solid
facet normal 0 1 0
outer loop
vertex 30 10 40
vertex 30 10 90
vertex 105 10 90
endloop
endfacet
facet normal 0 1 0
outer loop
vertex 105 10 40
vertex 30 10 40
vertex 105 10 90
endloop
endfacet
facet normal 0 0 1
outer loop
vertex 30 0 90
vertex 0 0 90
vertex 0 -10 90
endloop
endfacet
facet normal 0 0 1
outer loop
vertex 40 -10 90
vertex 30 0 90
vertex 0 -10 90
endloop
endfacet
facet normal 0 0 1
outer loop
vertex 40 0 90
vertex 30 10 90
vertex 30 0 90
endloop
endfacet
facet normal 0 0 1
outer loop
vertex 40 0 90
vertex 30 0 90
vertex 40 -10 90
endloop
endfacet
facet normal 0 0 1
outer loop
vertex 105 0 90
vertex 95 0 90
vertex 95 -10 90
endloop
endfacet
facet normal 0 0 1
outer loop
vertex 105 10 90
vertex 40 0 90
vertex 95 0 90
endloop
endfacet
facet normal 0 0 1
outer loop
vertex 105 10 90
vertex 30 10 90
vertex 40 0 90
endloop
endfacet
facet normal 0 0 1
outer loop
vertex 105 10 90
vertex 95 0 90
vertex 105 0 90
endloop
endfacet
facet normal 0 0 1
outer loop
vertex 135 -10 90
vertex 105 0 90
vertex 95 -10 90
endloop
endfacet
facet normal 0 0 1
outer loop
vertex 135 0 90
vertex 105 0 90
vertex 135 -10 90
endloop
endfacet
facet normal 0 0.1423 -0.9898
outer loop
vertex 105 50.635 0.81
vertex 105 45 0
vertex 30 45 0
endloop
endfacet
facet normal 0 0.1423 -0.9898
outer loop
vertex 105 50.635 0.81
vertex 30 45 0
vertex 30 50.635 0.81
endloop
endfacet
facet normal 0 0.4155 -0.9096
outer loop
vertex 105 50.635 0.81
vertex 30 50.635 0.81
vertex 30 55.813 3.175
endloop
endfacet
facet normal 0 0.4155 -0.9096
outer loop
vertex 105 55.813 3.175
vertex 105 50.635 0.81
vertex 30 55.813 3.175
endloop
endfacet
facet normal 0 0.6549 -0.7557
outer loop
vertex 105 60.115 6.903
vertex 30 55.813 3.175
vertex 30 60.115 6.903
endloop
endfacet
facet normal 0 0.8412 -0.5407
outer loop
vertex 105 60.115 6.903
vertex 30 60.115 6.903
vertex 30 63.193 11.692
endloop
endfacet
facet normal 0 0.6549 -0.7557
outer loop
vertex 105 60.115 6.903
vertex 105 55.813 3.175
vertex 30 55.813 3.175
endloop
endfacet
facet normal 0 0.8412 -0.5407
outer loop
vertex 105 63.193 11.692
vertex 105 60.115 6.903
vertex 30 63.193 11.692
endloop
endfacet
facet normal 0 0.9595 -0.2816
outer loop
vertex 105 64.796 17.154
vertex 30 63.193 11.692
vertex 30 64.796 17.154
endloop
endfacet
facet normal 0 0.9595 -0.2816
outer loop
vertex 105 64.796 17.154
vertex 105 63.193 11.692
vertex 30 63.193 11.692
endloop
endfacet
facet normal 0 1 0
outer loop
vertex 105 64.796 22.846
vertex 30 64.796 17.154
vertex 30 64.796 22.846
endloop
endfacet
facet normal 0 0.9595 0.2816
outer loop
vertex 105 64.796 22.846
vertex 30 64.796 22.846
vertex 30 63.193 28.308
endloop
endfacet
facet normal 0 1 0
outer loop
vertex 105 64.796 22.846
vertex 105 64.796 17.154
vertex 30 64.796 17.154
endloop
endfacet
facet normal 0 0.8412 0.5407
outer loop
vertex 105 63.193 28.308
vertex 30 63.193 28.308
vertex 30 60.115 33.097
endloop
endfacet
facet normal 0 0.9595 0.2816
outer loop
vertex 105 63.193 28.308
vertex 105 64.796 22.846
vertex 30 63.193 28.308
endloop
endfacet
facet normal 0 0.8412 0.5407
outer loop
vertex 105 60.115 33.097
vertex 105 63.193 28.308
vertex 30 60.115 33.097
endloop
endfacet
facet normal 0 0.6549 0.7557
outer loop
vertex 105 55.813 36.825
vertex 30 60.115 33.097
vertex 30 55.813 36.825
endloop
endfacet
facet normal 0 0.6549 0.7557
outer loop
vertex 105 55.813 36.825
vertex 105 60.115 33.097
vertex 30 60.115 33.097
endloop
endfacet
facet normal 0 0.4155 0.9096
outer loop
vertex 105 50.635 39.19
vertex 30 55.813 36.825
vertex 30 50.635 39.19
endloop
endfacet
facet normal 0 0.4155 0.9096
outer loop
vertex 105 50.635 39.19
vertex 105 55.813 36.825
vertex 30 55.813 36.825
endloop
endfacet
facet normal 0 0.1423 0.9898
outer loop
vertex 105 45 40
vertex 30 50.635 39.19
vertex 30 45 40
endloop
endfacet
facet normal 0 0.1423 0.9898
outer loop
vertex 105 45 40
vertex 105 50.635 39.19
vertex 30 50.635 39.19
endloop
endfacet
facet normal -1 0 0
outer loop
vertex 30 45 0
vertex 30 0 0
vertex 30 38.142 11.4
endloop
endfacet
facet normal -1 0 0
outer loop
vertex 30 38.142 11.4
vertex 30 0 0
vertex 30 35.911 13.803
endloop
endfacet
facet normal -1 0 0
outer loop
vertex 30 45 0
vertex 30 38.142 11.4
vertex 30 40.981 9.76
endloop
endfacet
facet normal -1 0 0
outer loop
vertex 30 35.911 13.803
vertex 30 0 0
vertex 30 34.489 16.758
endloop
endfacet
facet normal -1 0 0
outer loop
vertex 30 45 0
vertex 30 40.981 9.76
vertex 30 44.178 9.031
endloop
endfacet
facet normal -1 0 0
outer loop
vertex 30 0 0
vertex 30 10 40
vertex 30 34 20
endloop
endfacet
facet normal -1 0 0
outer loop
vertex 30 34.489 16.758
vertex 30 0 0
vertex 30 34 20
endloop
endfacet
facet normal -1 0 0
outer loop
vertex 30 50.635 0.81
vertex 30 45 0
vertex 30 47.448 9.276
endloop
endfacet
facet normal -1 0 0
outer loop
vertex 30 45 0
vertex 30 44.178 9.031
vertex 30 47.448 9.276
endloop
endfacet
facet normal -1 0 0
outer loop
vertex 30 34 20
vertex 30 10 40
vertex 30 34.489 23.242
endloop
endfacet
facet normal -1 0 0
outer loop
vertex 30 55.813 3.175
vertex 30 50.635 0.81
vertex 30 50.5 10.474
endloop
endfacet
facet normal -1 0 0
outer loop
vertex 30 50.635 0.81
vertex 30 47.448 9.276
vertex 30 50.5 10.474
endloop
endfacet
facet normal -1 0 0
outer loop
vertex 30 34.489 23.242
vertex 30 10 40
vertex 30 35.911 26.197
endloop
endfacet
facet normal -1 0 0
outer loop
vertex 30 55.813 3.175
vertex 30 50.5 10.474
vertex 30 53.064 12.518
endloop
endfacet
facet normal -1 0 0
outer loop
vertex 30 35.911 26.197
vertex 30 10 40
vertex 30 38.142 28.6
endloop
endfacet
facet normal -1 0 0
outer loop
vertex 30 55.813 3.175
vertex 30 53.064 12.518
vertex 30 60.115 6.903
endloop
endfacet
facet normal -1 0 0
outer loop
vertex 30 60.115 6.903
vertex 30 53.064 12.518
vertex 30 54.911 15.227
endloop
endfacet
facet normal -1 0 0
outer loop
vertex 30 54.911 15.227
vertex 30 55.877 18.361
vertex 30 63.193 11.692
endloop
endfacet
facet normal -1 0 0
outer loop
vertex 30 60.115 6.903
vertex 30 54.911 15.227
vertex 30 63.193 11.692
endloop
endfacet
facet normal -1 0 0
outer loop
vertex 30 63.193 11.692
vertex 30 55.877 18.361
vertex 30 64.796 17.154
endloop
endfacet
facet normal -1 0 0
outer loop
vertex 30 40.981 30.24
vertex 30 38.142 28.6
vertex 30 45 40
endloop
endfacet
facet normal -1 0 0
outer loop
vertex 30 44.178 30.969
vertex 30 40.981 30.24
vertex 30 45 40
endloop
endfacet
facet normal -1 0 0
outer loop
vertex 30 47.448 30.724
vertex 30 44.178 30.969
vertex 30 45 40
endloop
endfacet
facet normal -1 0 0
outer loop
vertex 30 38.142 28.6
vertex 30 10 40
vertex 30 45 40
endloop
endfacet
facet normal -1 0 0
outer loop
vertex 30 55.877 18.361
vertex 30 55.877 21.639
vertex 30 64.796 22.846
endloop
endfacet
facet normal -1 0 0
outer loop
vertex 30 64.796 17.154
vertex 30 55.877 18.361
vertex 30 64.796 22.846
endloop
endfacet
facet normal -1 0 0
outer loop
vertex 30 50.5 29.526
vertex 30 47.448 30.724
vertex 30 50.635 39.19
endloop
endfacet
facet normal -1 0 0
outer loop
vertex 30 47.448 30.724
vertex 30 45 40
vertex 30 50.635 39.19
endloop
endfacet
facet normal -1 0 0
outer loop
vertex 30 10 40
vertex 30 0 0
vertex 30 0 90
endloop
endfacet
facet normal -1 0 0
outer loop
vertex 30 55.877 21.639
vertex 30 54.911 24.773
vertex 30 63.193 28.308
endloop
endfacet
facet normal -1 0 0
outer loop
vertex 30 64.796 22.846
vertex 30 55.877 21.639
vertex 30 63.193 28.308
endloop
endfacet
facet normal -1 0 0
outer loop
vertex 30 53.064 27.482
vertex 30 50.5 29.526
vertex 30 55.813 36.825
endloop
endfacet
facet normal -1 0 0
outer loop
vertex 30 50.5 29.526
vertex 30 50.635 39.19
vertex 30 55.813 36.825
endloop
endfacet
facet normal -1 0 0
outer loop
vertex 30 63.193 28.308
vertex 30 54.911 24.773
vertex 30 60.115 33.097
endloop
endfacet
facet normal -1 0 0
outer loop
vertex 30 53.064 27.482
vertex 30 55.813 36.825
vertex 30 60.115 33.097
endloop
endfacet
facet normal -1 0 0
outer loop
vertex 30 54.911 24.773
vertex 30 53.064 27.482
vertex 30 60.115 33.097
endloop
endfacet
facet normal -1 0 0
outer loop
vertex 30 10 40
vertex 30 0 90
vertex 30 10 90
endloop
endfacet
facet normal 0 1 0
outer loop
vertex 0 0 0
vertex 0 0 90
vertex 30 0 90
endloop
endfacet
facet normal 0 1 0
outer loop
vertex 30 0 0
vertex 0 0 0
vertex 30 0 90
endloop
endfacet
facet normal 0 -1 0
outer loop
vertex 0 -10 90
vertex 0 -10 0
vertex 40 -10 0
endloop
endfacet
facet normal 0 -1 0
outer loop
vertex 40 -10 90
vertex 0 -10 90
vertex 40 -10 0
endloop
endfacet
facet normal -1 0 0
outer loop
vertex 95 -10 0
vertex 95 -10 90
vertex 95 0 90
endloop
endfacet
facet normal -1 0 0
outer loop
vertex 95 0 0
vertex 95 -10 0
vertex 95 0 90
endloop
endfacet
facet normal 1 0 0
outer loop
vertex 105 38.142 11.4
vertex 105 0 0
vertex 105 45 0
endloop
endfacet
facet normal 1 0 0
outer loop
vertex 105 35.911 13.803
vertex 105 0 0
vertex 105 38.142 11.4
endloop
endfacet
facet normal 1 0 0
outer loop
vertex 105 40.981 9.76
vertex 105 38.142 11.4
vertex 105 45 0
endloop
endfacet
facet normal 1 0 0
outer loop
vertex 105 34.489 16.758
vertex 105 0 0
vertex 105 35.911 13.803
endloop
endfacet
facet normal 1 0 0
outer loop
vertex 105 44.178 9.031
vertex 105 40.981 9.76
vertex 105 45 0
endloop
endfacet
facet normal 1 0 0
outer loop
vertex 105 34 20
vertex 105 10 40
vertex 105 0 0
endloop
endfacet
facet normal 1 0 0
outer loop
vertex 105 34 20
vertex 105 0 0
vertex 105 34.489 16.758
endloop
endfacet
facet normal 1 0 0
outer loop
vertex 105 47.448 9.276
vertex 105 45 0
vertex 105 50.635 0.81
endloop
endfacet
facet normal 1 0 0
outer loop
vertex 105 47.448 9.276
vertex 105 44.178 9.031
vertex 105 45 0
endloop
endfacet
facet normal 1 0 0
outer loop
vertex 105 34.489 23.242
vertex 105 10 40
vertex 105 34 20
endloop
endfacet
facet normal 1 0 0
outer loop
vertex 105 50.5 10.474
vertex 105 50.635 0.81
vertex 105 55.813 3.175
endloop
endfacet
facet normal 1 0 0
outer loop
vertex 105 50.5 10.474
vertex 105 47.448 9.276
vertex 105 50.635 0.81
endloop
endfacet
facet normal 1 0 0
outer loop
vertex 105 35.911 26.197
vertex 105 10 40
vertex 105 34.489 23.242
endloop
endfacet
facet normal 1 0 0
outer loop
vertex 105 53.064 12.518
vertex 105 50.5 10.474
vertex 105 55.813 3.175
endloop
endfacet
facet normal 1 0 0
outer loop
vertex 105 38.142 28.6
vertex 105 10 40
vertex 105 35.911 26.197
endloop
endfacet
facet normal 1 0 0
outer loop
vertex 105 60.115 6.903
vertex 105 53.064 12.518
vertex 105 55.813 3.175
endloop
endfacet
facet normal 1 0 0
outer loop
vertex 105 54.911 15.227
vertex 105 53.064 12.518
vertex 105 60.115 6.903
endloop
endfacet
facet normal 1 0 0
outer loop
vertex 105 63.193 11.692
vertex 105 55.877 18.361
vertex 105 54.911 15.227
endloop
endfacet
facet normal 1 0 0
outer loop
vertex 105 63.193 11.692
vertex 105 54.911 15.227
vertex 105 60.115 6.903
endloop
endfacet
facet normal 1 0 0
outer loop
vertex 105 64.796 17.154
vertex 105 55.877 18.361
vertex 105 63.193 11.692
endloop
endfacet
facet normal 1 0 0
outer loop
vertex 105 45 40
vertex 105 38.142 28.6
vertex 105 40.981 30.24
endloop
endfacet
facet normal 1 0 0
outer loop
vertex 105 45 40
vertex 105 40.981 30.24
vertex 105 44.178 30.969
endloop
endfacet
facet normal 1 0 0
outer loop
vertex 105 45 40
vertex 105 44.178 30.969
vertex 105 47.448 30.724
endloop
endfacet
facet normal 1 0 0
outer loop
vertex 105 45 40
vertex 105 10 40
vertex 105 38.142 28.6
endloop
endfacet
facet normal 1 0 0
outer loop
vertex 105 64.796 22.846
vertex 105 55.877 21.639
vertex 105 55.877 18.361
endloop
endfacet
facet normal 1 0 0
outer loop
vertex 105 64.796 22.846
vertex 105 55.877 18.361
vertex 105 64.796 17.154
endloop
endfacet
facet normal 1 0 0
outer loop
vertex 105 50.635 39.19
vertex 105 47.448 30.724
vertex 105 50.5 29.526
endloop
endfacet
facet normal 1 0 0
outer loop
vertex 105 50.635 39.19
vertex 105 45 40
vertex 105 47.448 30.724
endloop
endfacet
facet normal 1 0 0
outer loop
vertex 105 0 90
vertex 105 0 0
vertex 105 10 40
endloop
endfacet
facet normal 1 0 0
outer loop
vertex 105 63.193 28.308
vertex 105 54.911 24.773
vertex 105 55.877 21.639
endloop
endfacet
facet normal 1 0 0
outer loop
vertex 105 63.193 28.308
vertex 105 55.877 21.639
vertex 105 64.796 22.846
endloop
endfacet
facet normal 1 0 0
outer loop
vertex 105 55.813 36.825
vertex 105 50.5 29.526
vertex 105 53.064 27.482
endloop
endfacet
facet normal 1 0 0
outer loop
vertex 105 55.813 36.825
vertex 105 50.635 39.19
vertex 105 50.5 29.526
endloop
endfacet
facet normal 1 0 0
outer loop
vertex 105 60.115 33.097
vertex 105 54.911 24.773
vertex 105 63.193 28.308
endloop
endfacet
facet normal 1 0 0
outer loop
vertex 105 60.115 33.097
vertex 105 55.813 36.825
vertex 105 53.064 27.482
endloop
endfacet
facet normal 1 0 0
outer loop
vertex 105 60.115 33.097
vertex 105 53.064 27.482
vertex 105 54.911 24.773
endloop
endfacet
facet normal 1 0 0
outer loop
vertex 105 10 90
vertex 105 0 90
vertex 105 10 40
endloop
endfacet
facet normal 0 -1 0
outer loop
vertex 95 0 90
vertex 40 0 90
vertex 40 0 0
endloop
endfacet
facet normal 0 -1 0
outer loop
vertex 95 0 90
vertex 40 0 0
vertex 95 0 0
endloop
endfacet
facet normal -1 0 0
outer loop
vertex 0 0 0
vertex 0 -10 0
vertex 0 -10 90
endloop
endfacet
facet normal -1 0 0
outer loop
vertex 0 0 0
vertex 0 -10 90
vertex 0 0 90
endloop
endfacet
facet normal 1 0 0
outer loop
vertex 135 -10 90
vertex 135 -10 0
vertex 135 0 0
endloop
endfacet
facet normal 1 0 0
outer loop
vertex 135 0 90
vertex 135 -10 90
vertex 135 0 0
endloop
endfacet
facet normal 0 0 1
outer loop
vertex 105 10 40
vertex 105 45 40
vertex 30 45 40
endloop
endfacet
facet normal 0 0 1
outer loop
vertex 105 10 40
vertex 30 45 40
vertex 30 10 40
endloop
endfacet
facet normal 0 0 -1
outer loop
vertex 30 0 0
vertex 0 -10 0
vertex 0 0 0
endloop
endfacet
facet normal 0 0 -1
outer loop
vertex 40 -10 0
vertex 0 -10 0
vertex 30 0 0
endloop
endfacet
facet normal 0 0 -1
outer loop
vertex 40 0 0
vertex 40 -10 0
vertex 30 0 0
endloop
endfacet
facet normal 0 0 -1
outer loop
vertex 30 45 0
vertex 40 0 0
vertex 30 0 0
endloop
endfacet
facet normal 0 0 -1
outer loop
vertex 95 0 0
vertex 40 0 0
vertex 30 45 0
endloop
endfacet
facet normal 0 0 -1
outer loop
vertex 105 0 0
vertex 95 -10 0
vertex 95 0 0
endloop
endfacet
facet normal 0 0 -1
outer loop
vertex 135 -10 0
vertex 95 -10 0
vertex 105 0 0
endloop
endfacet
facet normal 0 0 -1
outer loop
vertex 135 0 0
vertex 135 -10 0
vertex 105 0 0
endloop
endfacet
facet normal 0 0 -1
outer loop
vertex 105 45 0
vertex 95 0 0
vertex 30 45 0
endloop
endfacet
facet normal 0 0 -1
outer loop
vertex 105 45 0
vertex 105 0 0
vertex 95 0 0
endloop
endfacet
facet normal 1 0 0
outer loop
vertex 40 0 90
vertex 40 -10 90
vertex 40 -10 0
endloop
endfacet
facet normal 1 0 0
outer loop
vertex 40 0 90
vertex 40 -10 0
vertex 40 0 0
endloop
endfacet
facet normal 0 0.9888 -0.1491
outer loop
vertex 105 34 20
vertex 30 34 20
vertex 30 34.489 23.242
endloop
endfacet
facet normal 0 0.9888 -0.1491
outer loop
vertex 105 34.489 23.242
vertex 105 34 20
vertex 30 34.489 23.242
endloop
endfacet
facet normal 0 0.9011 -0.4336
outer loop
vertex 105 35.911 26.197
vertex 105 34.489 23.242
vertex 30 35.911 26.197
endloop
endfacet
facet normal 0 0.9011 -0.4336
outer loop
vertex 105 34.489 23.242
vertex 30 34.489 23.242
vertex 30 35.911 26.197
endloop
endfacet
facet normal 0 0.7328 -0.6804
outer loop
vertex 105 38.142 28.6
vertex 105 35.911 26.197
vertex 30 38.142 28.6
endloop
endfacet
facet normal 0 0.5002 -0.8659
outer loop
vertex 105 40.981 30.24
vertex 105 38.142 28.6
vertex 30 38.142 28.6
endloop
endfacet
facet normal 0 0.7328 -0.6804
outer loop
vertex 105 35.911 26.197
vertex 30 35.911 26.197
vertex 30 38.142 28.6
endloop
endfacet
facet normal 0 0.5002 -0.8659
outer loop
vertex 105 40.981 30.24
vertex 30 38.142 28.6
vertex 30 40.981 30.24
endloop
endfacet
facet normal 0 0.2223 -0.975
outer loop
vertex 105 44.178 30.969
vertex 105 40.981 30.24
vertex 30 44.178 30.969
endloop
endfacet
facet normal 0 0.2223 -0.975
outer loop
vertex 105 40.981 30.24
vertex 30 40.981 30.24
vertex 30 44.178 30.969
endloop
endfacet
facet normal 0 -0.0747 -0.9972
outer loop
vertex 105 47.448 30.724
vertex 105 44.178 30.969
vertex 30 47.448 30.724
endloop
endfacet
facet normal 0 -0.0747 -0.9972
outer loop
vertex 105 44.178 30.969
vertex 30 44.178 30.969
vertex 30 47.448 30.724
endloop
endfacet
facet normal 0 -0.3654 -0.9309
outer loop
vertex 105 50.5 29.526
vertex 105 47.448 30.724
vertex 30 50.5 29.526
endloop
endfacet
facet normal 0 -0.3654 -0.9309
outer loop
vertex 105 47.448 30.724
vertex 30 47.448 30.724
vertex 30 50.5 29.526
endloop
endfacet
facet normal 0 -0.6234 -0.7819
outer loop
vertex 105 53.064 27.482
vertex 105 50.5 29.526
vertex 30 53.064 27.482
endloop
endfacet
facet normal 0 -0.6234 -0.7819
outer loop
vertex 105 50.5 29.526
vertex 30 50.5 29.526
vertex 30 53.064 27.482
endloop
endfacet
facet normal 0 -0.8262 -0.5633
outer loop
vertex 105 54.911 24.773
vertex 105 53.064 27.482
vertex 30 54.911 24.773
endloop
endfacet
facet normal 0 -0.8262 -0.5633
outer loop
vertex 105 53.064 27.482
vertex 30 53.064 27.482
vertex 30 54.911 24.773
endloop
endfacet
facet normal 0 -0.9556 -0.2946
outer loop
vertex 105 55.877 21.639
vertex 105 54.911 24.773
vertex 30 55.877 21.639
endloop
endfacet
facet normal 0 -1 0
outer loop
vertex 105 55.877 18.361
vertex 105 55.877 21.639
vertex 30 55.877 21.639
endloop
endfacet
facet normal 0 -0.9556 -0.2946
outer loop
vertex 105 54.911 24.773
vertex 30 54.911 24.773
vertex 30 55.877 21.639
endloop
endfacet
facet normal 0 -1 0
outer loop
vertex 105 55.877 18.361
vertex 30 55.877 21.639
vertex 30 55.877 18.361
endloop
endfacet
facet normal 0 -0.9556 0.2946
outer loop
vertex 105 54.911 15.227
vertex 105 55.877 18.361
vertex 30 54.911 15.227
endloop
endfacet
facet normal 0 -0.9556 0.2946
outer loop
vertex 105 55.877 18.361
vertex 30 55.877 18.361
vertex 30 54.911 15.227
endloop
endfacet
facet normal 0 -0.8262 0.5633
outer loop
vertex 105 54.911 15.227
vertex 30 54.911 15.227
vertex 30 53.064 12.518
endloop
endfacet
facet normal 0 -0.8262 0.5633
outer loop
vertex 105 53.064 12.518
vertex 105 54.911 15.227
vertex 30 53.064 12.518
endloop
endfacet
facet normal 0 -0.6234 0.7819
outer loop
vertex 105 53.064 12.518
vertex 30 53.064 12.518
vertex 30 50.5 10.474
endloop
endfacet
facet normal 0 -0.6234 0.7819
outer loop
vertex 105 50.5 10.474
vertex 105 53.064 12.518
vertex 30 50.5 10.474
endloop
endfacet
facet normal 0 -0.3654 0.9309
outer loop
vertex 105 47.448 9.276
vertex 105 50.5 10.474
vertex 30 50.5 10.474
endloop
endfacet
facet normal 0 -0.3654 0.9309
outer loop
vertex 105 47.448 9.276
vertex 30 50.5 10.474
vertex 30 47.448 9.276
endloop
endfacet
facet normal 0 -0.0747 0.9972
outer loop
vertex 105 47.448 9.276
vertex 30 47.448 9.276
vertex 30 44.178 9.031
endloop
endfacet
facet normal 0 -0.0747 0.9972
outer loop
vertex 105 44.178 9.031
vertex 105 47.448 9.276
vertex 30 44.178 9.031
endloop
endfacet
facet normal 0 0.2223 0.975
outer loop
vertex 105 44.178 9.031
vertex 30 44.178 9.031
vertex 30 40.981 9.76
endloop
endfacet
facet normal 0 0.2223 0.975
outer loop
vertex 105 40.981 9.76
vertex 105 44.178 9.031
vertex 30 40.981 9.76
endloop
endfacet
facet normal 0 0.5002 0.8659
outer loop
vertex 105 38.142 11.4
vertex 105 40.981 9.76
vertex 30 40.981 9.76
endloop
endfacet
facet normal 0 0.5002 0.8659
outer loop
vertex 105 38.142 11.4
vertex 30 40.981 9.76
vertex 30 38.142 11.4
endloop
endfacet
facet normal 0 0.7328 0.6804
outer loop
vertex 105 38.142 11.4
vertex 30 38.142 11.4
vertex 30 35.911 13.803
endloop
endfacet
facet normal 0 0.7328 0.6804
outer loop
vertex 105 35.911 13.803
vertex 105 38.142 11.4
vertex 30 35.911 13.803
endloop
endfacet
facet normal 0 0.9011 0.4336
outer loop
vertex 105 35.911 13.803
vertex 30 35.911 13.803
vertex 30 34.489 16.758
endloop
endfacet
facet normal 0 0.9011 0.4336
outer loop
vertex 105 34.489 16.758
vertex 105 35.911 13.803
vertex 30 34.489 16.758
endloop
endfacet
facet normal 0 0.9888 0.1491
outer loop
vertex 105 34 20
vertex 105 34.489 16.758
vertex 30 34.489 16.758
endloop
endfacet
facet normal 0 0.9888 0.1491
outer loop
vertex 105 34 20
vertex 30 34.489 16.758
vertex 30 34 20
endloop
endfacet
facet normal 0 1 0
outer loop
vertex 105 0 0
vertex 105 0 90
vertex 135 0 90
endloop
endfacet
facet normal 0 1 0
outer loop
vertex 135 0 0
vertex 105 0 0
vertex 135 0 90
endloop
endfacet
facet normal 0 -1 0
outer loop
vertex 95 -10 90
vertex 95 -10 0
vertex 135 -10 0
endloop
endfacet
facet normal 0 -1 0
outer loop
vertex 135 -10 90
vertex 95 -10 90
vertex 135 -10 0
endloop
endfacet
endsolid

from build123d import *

# Parameters (mm, degrees)
F0_W     = 135
F0_H     = 10
F1_DEPTH = 90
F2_W     = 75
F2_H     = 90
F3_DEPTH = 10
F4_W     = 55
F4_H     = 10
F5_DEPTH = 90.001
F7_DEPTH = 75
F10_D    = 22


with BuildPart() as f1:
    # F0 (on Top) → F1 (new body)
    with BuildSketch(Plane.XY):
        with Locations((67.5, -5)):
            Rectangle(F0_W, F0_H)
    extrude(amount=F1_DEPTH)

    # F2 (on Front) → F3 (join)
    with BuildSketch(Plane.XZ):
        with Locations((67.5, 45)):
            Rectangle(F2_W, F2_H)
    extrude(amount=-F3_DEPTH)

    # F4 (on face) → F5 (cut, through all)
    with BuildSketch(Plane.XY.offset(90)):
        with Locations((67.5, -5)):
            Rectangle(F4_W, F4_H)
    extrude(amount=-F5_DEPTH, mode=Mode.SUBTRACT)

    # F6 (on face) → F7 (join)
    with BuildSketch(Plane.YZ.offset(105)):
        with BuildLine():
            Line((10, 40), (10, 0))
            Line((10, 0), (45, 0))
            ThreePointArc((45, 0), (65, 20), (45, 40))
            Line((45, 40), (10, 40))
        make_face()
    extrude(amount=-F7_DEPTH)

    # F10 (through all)
    with Locations(Plane.YZ.offset(105)):
        with Locations((45, 20)):
            Hole(F10_D / 2)


solid = f1.part
